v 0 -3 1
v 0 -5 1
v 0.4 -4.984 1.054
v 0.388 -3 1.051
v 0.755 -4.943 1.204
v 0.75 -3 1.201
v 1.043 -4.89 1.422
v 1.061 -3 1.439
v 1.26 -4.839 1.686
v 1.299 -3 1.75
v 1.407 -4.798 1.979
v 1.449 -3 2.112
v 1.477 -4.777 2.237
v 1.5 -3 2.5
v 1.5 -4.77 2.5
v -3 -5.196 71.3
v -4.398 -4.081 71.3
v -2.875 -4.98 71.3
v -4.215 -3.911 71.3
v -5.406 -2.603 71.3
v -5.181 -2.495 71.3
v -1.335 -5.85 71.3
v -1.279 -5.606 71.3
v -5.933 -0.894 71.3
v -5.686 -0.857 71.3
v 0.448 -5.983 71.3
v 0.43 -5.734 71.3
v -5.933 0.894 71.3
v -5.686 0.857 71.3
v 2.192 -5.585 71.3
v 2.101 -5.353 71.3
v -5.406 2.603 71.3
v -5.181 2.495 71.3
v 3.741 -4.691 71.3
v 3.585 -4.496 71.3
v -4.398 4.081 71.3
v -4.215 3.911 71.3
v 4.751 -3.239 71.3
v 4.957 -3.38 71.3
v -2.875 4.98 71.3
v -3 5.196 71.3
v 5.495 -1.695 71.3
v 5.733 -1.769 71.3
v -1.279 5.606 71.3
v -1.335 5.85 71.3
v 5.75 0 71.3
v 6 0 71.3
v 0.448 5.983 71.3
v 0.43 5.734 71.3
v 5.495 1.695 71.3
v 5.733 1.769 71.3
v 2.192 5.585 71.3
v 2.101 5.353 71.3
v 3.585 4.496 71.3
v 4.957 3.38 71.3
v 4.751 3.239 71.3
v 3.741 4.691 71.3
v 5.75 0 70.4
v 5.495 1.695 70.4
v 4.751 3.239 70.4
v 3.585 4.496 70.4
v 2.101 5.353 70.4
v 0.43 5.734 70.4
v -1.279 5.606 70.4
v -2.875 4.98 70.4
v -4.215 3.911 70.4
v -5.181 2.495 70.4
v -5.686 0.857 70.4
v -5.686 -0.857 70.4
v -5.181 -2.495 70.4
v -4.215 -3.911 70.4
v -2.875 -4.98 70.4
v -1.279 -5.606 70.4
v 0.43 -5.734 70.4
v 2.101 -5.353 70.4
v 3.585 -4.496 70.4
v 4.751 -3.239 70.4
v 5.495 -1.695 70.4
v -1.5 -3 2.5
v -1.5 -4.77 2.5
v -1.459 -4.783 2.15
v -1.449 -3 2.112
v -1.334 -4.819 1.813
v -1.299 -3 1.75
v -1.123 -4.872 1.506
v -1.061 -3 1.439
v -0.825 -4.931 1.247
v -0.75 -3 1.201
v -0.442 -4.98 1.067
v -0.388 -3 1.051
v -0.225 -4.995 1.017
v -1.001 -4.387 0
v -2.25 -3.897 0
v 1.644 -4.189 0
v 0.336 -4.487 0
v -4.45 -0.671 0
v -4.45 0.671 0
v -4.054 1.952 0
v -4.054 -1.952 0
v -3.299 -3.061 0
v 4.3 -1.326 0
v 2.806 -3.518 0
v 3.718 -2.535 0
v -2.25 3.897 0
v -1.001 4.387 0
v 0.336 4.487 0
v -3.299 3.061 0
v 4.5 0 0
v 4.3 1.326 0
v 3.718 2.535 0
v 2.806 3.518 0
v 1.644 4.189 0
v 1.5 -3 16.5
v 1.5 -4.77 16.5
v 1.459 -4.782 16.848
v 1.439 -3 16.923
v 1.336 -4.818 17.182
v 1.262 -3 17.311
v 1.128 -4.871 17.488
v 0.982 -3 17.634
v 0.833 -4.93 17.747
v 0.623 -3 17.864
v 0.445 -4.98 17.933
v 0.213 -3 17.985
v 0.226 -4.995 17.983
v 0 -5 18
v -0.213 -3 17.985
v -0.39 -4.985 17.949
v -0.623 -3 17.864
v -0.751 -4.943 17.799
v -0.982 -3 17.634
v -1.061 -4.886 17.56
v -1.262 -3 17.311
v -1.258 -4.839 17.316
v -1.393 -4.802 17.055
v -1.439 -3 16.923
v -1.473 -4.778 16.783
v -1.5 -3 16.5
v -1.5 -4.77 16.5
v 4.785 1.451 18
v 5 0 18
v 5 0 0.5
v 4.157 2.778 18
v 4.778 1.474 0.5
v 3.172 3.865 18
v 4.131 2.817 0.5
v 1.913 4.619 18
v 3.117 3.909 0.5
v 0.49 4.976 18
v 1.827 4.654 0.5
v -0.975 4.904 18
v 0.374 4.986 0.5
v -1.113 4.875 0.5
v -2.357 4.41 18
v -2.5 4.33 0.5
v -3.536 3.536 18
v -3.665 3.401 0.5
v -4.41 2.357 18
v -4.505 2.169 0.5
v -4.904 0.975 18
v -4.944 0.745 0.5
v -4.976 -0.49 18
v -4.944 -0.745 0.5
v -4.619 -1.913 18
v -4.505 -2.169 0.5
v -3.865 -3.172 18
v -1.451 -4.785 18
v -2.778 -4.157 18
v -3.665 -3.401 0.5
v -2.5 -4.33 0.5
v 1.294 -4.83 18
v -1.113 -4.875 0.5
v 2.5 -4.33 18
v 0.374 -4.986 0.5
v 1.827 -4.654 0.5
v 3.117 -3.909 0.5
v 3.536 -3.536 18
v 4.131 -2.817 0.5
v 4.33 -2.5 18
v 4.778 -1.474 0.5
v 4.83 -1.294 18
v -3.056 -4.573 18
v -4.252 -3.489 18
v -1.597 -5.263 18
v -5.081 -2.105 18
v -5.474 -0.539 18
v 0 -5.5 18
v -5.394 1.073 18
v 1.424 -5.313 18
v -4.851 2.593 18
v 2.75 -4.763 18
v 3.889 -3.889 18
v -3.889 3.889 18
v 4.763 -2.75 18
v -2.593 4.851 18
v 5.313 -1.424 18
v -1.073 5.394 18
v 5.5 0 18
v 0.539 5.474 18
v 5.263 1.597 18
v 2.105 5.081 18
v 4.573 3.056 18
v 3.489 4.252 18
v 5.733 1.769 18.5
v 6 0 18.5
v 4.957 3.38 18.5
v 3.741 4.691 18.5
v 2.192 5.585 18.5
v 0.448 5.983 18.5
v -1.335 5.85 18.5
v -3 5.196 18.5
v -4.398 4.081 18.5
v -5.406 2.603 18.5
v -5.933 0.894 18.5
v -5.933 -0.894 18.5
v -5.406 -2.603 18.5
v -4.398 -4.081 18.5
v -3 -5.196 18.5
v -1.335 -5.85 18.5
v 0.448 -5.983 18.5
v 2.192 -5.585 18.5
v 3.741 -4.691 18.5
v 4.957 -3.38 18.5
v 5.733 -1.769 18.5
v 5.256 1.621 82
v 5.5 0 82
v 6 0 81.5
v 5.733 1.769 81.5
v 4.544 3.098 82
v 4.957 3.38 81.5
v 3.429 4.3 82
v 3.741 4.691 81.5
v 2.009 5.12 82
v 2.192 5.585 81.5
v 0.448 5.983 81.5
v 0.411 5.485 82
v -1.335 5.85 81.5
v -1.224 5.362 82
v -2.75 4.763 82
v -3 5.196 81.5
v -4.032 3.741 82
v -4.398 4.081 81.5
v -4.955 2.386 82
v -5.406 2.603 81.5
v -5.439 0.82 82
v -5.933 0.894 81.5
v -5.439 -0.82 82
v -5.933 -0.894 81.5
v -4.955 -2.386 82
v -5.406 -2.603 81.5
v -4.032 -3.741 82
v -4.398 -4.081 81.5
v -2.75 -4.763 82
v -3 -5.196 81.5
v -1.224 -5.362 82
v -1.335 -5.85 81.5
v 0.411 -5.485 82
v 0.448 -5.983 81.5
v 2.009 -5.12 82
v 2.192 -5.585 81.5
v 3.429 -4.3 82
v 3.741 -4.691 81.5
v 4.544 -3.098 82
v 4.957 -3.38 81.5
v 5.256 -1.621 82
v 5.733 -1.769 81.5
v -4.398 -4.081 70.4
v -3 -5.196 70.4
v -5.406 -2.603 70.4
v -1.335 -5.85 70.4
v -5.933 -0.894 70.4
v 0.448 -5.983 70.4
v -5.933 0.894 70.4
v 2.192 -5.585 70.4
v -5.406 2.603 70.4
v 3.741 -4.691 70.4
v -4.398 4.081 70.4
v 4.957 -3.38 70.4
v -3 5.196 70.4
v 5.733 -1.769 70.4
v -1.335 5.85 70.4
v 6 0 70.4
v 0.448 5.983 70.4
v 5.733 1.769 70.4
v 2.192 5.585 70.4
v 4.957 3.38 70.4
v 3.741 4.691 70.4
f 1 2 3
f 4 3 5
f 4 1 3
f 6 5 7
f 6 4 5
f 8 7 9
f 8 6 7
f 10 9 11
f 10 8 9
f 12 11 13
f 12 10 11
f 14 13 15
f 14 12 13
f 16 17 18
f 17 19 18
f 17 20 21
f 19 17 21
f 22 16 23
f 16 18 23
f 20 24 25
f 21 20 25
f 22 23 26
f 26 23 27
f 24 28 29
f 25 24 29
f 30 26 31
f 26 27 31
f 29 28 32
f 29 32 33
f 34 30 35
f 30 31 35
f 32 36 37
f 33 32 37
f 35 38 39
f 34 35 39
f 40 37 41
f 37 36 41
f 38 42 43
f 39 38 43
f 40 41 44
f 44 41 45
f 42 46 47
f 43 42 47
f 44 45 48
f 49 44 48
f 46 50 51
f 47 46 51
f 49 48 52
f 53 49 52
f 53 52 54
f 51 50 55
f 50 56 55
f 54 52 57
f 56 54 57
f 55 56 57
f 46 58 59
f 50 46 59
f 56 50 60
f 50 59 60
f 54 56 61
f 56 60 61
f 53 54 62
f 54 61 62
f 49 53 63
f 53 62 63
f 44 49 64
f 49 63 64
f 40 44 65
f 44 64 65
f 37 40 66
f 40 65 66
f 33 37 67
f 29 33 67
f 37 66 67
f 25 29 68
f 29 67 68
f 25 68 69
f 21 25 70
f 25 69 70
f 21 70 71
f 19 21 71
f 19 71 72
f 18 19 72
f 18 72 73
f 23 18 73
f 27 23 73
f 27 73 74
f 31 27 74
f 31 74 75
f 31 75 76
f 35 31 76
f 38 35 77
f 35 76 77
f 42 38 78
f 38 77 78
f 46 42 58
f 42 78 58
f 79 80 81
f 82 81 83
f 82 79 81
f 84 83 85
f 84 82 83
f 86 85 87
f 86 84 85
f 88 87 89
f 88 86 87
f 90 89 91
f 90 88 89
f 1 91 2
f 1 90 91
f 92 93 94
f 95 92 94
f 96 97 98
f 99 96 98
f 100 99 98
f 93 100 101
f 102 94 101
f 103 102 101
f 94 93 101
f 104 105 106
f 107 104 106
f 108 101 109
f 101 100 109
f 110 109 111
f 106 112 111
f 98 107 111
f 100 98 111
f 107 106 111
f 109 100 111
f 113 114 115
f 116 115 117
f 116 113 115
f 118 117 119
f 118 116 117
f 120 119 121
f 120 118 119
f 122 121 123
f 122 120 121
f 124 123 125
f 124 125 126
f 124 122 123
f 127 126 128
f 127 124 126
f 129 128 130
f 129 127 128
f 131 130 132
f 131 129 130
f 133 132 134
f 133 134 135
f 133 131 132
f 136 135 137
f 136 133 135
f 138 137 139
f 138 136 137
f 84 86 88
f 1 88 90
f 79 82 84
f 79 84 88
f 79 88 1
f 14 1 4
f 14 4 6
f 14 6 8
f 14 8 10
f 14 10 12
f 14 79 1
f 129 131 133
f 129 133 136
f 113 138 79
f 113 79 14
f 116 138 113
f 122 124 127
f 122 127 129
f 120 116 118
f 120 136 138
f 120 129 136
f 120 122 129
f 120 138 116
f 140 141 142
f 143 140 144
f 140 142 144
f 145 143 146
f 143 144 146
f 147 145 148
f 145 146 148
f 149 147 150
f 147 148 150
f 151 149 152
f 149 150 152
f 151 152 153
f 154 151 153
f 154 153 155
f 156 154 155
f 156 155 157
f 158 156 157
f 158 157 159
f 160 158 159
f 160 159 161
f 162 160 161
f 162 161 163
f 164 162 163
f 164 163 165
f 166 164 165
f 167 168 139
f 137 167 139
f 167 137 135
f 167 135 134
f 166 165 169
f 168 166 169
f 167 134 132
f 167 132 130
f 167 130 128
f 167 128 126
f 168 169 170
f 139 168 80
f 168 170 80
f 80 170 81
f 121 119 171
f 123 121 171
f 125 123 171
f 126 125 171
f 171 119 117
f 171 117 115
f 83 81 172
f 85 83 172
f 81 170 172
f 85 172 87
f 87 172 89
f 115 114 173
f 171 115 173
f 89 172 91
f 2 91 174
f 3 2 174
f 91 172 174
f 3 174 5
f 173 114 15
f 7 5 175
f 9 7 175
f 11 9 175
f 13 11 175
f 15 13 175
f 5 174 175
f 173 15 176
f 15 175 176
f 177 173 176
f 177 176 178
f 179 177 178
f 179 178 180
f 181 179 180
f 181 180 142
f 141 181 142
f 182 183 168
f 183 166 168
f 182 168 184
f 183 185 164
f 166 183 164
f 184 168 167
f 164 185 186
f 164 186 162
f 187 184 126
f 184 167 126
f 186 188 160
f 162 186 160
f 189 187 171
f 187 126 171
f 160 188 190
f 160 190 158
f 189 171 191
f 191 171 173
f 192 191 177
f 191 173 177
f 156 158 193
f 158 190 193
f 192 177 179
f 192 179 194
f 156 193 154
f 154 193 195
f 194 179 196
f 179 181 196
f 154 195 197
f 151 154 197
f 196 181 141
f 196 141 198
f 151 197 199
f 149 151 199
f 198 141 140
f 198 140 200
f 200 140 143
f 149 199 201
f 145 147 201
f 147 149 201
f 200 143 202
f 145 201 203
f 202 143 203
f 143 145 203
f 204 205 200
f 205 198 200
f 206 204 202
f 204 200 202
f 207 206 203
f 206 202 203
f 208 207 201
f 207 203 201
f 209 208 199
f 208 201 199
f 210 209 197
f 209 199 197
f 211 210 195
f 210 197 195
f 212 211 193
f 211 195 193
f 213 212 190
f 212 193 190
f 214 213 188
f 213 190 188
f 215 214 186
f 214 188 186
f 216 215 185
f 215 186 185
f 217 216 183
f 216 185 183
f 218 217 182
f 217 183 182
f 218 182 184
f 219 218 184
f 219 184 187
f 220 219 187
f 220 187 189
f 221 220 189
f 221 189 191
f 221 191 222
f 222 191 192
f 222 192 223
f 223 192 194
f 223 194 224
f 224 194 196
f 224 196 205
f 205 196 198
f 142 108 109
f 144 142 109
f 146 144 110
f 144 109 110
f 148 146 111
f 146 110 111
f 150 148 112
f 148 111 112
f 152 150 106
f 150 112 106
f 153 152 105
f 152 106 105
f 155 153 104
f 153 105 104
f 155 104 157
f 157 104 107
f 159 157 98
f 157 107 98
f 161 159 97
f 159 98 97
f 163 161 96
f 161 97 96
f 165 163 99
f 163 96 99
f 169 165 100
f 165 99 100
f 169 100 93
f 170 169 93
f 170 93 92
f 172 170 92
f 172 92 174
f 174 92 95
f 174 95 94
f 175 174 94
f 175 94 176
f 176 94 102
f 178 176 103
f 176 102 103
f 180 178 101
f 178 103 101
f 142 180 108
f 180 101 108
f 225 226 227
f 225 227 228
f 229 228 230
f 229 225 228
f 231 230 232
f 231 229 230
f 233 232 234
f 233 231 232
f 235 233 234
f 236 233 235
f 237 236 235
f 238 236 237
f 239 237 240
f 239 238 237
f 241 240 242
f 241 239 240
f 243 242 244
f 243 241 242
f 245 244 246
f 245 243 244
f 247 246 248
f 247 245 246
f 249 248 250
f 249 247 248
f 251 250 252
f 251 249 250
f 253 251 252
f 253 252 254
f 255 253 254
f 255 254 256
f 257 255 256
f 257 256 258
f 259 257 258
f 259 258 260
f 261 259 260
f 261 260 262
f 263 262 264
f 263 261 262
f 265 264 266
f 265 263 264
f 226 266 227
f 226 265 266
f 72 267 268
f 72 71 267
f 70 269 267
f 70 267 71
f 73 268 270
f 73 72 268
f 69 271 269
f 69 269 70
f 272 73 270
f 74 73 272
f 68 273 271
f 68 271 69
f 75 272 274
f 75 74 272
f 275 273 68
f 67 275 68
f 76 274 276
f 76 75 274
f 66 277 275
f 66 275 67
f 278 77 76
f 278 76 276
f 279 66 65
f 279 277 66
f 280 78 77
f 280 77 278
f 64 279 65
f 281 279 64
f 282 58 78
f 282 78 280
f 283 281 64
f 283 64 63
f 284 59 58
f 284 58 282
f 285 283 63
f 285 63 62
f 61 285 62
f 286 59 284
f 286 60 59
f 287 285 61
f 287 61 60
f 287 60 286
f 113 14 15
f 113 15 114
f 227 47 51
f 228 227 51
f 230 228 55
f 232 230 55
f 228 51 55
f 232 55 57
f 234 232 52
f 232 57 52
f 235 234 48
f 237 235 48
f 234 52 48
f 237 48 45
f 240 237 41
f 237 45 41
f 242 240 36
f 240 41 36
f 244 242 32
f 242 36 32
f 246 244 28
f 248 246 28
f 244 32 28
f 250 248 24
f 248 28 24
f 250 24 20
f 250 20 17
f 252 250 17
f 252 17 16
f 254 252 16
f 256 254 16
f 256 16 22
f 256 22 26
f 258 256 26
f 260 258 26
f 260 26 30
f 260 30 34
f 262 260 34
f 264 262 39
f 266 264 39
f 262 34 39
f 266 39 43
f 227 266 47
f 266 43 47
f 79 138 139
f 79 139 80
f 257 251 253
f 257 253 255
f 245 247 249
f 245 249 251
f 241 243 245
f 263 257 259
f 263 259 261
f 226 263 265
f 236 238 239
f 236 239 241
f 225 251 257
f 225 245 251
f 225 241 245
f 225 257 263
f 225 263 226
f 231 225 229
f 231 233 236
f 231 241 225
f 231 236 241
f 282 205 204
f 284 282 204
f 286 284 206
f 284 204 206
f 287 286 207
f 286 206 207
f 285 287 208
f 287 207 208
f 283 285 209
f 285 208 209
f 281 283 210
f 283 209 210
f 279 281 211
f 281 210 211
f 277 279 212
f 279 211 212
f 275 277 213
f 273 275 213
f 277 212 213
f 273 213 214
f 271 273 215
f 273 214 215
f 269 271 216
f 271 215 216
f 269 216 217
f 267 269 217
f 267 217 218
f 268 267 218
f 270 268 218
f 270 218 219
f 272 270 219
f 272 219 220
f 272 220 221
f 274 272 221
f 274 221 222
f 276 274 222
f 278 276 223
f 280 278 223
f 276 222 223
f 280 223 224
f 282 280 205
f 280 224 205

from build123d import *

# Parameters (mm, degrees)
F0_R      = 5
F1_DEPTH  = 18
F2_R      = 6
F3_DEPTH  = 52.4
F4_R      = 5.75
F5_DEPTH  = 0.9
F6_R      = 6
F7_DEPTH  = 10.7
F8_SIZE2  = 0.5
F8_SIZE   = 0.5
F9_SIZE2  = 0.5
F9_SIZE   = 0.5
F10_SIZE2 = 0.5
F10_SIZE  = 0.5
F12_START = 3
F12_DEPTH = 22


with BuildPart() as f1:
    # F0 (on Top) → F1 (new body)
    with BuildSketch(Plane.XY):
        Circle(F0_R)
    extrude(amount=F1_DEPTH)

    # F2 (on face) → F3 (join)
    with BuildSketch(Plane.XY.offset(18)):
        Circle(F2_R)
    extrude(amount=F3_DEPTH)

    # F4 (on face) → F5 (join)
    with BuildSketch(Plane.XY.offset(70.4)):
        Circle(F4_R)
    extrude(amount=F5_DEPTH)

    # F6 (on face) → F7 (join)
    with BuildSketch(Plane.XY.offset(71.3)):
        Circle(F6_R)
    extrude(amount=F7_DEPTH)

    # F8
    f8_edges = [f1.edges().sort_by_distance(p)[0] for p in [
        (-6, 0, 82),
    ]]
    chamfer(f8_edges, length=F8_SIZE, length2=F8_SIZE2)

    # F9
    f9_edges = [f1.edges().sort_by_distance(p)[0] for p in [
        (-6, 0, 18),
    ]]
    chamfer(f9_edges, length=F9_SIZE, length2=F9_SIZE2)

    # F10
    f10_edges = [f1.edges().sort_by_distance(p)[0] for p in [
        (-5, 0, 0),
    ]]
    chamfer(f10_edges, length=F10_SIZE, length2=F10_SIZE2)

    # F11 (on Front) → F12 (cut)
    with BuildSketch(Plane.XZ.offset(F12_START)):
        with BuildLine():
            Line((1.5, 2.5), (1.5, 16.5))
            ThreePointArc((1.5, 16.5), (0, 18), (-1.5, 16.5))
            Line((-1.5, 16.5), (-1.5, 2.5))
            ThreePointArc((-1.5, 2.5), (-1.0606601718, 1.4393398282), (0, 1))
            ThreePointArc((0, 1), (1.0606601718, 1.4393398282), (1.5, 2.5))
        make_face()
    extrude(amount=F12_DEPTH, mode=Mode.SUBTRACT)


solid = f1.part
